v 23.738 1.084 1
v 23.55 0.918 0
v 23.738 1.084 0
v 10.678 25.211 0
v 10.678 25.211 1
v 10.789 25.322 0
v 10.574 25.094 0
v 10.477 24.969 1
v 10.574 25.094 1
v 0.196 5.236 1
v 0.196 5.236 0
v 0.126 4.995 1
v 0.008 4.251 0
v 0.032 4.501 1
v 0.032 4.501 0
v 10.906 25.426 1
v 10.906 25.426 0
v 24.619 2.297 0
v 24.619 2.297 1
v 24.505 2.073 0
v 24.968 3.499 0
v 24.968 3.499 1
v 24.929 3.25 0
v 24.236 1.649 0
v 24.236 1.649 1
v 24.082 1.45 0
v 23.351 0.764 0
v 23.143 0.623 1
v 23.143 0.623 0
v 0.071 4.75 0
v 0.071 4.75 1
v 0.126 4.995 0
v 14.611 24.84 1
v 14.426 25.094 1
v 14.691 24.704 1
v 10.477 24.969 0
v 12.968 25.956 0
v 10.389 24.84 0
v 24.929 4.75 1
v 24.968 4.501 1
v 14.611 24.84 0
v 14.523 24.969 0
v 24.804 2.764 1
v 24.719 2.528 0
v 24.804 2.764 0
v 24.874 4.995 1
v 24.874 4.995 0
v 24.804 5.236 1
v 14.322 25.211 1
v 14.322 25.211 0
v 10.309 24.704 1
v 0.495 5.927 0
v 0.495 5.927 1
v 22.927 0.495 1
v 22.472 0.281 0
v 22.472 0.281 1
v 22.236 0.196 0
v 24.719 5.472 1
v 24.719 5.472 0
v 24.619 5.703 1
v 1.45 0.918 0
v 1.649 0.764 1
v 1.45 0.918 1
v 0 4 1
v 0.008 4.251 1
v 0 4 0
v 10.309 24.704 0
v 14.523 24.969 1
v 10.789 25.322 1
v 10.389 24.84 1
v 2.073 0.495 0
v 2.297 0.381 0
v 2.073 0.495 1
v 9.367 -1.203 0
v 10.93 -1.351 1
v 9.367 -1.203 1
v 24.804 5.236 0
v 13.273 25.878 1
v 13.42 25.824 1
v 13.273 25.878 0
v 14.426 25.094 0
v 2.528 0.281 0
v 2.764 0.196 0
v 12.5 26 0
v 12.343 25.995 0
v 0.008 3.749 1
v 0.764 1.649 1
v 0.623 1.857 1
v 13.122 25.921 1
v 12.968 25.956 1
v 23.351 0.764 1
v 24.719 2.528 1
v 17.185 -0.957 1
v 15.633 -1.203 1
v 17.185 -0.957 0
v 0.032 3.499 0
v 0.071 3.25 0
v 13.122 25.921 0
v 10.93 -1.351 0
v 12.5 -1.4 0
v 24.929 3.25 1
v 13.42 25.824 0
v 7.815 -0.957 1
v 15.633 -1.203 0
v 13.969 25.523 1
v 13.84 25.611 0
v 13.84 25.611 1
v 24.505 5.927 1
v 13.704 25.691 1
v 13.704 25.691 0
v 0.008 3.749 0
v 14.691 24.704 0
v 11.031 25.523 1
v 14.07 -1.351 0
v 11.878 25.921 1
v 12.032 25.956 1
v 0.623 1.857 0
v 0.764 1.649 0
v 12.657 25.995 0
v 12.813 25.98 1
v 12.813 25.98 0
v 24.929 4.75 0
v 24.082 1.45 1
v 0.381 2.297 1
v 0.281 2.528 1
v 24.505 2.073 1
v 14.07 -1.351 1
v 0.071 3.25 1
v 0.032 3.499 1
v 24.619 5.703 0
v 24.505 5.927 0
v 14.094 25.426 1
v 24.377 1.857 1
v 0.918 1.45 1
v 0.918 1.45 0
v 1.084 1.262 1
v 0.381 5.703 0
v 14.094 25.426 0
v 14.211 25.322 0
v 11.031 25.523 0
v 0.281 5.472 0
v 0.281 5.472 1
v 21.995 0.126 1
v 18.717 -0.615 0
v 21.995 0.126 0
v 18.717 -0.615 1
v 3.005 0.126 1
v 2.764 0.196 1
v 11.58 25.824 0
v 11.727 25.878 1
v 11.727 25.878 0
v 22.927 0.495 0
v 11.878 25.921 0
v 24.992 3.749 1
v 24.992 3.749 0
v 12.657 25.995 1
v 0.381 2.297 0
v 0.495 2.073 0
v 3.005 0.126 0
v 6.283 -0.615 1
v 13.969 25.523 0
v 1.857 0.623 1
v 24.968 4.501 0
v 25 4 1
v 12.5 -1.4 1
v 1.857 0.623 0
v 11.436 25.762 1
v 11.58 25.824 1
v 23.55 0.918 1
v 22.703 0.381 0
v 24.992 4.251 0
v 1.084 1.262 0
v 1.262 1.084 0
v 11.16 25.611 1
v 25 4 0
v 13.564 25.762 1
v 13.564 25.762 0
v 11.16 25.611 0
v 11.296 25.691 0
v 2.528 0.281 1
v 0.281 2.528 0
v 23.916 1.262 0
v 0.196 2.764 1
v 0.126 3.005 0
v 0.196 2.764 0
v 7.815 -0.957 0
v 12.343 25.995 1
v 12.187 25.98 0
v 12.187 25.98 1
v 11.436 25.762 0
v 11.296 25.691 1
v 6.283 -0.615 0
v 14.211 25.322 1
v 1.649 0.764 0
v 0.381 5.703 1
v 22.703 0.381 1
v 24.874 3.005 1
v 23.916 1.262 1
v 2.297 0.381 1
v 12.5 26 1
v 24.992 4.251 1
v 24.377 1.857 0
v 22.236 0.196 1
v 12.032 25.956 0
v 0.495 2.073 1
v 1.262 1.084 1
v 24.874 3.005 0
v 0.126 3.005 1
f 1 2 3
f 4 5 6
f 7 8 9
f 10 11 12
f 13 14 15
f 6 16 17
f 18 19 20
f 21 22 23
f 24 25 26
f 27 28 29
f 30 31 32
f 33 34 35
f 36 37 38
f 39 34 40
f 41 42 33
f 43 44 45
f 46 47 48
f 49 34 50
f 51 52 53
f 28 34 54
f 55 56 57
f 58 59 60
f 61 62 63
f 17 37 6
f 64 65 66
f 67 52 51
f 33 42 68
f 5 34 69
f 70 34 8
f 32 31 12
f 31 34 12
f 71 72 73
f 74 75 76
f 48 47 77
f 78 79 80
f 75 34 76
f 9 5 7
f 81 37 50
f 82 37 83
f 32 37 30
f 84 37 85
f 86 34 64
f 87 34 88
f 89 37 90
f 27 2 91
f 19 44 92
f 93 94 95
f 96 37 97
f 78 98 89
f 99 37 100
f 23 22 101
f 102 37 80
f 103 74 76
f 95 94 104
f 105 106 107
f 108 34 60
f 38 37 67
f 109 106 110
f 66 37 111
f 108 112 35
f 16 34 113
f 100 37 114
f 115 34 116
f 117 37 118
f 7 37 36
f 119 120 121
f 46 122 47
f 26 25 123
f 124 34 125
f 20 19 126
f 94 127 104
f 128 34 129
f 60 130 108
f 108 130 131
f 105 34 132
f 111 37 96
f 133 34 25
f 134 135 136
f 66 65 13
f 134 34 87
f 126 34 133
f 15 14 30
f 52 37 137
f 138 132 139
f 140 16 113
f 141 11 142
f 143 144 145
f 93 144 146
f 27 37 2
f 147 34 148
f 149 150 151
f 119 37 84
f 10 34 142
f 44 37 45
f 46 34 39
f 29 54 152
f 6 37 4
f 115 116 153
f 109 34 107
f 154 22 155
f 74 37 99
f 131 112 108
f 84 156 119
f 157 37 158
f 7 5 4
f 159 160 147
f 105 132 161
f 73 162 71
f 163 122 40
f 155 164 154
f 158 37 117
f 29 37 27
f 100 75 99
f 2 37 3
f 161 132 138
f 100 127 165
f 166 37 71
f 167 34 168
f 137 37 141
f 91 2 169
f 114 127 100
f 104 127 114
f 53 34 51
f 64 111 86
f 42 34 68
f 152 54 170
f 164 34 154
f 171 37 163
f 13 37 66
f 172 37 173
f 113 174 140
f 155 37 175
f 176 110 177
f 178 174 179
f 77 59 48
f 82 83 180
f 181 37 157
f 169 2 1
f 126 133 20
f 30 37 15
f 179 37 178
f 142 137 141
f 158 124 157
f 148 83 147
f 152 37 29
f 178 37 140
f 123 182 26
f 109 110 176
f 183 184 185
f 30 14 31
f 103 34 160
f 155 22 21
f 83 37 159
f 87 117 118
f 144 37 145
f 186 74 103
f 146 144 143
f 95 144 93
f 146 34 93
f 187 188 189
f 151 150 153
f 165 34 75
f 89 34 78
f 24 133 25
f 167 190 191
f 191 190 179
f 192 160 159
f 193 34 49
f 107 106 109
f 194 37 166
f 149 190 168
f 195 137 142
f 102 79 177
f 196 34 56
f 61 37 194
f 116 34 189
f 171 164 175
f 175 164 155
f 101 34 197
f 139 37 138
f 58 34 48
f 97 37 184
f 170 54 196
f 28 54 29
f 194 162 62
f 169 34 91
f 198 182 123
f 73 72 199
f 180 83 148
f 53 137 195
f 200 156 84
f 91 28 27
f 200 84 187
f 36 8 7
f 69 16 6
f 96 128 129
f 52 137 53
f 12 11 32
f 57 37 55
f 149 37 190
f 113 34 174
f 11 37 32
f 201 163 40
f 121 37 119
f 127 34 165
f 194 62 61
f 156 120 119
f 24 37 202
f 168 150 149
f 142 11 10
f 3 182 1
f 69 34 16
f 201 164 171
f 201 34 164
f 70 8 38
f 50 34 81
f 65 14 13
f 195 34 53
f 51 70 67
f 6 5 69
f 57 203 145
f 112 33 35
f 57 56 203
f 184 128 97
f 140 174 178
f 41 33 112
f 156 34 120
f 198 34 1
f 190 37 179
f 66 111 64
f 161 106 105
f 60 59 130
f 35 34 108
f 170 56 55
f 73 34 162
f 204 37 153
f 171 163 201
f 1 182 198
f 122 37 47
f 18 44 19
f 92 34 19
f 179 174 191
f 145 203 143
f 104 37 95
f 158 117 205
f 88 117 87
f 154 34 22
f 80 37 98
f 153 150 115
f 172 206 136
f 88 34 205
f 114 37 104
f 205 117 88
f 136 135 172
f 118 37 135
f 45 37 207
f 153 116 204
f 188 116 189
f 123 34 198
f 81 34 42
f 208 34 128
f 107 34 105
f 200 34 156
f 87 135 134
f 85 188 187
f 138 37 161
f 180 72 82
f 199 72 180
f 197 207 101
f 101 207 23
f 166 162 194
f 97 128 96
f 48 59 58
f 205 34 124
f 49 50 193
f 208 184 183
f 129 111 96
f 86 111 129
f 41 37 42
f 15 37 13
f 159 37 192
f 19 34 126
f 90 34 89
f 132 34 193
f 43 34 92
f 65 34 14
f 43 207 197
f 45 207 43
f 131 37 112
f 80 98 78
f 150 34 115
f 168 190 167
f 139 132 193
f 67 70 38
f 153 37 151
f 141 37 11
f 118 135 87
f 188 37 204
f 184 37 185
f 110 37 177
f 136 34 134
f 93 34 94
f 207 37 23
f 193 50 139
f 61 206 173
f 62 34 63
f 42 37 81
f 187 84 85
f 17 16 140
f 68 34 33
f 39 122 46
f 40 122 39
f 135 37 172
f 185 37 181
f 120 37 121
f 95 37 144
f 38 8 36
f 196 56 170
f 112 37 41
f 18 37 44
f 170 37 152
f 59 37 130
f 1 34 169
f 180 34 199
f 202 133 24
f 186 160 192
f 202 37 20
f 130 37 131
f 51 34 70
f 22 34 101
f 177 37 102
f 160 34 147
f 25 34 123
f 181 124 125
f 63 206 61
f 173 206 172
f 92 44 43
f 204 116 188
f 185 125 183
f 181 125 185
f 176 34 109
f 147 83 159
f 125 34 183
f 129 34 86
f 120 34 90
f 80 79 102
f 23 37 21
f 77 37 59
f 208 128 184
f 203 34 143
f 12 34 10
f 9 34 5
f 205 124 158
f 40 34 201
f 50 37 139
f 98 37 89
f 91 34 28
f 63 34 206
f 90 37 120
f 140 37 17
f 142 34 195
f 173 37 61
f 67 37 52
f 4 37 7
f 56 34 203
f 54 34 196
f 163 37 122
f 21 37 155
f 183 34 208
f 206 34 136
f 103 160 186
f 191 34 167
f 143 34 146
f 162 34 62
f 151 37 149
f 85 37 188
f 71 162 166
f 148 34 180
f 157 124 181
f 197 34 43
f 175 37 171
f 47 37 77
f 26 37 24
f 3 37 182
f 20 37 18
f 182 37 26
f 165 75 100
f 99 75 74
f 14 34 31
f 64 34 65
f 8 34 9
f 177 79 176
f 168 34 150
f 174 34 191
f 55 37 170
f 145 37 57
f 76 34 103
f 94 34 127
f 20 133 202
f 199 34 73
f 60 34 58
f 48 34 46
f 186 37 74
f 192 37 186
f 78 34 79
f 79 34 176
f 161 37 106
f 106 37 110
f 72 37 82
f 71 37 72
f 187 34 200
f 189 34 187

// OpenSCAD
// preview[vi5ew:south, tilt:top]

// Grading thickness
// Images
// Text / Letters
// Colour

/* [Main] */

//how wide to make the guitar pick
base = 25;

//how tall to make the guitar pick
height = 30;

//how thick to make the guitar pick
thickness = 1;

//how rounded to make the corners
radii = [4, 4, 2.5];

//how curved to make the base (0 is straight)
curve = 25;

//adjusts how close the curve is to the center of the pick
curve_offset = 1.4;

//how smooth to render all circles
smooth = 100;

module pick(base, height, t, r, curve, co) {
  r0 = max(radii[0], 0.01);
  r1 = max(radii[1], 0.01);
  r2 = max(radii[2], 0.01);

  lw = r0 + r1;
  lh = r2 + max(r0, r1);

  hull()
  {
    translate([r0, r0, 0]) {
      cylinder(r=r0, h=t, $fn=smooth);
    }

    translate([base-r1, r1, 0]) {
      cylinder(r=r1, h=t, $fn=smooth);
    }

    translate([(base-r1+r0)/2, height-lh, 0]) {
      cylinder(r=r2, h=t, $fn=smooth);
    }

    if (curve > 0) {
translate([base/2, curve-co, 0])
difference() {
  rotate_extrude($fn=smooth)
    translate([curve-.01, 0, 0])
      square([.01, t]);
  translate([base/2-lw/2, -curve, -1])
    cube([curve, curve*2, t+1]);
  translate([-curve, 0, -1])
    cube([curve*2, curve, t+1]);
  translate([-curve-(base/2-lw/2), -curve, -1])
    cube([curve, curve, t+1]);
}
    }
  }
}

pick(base, height, thickness, radii, curve, curve_offset);
